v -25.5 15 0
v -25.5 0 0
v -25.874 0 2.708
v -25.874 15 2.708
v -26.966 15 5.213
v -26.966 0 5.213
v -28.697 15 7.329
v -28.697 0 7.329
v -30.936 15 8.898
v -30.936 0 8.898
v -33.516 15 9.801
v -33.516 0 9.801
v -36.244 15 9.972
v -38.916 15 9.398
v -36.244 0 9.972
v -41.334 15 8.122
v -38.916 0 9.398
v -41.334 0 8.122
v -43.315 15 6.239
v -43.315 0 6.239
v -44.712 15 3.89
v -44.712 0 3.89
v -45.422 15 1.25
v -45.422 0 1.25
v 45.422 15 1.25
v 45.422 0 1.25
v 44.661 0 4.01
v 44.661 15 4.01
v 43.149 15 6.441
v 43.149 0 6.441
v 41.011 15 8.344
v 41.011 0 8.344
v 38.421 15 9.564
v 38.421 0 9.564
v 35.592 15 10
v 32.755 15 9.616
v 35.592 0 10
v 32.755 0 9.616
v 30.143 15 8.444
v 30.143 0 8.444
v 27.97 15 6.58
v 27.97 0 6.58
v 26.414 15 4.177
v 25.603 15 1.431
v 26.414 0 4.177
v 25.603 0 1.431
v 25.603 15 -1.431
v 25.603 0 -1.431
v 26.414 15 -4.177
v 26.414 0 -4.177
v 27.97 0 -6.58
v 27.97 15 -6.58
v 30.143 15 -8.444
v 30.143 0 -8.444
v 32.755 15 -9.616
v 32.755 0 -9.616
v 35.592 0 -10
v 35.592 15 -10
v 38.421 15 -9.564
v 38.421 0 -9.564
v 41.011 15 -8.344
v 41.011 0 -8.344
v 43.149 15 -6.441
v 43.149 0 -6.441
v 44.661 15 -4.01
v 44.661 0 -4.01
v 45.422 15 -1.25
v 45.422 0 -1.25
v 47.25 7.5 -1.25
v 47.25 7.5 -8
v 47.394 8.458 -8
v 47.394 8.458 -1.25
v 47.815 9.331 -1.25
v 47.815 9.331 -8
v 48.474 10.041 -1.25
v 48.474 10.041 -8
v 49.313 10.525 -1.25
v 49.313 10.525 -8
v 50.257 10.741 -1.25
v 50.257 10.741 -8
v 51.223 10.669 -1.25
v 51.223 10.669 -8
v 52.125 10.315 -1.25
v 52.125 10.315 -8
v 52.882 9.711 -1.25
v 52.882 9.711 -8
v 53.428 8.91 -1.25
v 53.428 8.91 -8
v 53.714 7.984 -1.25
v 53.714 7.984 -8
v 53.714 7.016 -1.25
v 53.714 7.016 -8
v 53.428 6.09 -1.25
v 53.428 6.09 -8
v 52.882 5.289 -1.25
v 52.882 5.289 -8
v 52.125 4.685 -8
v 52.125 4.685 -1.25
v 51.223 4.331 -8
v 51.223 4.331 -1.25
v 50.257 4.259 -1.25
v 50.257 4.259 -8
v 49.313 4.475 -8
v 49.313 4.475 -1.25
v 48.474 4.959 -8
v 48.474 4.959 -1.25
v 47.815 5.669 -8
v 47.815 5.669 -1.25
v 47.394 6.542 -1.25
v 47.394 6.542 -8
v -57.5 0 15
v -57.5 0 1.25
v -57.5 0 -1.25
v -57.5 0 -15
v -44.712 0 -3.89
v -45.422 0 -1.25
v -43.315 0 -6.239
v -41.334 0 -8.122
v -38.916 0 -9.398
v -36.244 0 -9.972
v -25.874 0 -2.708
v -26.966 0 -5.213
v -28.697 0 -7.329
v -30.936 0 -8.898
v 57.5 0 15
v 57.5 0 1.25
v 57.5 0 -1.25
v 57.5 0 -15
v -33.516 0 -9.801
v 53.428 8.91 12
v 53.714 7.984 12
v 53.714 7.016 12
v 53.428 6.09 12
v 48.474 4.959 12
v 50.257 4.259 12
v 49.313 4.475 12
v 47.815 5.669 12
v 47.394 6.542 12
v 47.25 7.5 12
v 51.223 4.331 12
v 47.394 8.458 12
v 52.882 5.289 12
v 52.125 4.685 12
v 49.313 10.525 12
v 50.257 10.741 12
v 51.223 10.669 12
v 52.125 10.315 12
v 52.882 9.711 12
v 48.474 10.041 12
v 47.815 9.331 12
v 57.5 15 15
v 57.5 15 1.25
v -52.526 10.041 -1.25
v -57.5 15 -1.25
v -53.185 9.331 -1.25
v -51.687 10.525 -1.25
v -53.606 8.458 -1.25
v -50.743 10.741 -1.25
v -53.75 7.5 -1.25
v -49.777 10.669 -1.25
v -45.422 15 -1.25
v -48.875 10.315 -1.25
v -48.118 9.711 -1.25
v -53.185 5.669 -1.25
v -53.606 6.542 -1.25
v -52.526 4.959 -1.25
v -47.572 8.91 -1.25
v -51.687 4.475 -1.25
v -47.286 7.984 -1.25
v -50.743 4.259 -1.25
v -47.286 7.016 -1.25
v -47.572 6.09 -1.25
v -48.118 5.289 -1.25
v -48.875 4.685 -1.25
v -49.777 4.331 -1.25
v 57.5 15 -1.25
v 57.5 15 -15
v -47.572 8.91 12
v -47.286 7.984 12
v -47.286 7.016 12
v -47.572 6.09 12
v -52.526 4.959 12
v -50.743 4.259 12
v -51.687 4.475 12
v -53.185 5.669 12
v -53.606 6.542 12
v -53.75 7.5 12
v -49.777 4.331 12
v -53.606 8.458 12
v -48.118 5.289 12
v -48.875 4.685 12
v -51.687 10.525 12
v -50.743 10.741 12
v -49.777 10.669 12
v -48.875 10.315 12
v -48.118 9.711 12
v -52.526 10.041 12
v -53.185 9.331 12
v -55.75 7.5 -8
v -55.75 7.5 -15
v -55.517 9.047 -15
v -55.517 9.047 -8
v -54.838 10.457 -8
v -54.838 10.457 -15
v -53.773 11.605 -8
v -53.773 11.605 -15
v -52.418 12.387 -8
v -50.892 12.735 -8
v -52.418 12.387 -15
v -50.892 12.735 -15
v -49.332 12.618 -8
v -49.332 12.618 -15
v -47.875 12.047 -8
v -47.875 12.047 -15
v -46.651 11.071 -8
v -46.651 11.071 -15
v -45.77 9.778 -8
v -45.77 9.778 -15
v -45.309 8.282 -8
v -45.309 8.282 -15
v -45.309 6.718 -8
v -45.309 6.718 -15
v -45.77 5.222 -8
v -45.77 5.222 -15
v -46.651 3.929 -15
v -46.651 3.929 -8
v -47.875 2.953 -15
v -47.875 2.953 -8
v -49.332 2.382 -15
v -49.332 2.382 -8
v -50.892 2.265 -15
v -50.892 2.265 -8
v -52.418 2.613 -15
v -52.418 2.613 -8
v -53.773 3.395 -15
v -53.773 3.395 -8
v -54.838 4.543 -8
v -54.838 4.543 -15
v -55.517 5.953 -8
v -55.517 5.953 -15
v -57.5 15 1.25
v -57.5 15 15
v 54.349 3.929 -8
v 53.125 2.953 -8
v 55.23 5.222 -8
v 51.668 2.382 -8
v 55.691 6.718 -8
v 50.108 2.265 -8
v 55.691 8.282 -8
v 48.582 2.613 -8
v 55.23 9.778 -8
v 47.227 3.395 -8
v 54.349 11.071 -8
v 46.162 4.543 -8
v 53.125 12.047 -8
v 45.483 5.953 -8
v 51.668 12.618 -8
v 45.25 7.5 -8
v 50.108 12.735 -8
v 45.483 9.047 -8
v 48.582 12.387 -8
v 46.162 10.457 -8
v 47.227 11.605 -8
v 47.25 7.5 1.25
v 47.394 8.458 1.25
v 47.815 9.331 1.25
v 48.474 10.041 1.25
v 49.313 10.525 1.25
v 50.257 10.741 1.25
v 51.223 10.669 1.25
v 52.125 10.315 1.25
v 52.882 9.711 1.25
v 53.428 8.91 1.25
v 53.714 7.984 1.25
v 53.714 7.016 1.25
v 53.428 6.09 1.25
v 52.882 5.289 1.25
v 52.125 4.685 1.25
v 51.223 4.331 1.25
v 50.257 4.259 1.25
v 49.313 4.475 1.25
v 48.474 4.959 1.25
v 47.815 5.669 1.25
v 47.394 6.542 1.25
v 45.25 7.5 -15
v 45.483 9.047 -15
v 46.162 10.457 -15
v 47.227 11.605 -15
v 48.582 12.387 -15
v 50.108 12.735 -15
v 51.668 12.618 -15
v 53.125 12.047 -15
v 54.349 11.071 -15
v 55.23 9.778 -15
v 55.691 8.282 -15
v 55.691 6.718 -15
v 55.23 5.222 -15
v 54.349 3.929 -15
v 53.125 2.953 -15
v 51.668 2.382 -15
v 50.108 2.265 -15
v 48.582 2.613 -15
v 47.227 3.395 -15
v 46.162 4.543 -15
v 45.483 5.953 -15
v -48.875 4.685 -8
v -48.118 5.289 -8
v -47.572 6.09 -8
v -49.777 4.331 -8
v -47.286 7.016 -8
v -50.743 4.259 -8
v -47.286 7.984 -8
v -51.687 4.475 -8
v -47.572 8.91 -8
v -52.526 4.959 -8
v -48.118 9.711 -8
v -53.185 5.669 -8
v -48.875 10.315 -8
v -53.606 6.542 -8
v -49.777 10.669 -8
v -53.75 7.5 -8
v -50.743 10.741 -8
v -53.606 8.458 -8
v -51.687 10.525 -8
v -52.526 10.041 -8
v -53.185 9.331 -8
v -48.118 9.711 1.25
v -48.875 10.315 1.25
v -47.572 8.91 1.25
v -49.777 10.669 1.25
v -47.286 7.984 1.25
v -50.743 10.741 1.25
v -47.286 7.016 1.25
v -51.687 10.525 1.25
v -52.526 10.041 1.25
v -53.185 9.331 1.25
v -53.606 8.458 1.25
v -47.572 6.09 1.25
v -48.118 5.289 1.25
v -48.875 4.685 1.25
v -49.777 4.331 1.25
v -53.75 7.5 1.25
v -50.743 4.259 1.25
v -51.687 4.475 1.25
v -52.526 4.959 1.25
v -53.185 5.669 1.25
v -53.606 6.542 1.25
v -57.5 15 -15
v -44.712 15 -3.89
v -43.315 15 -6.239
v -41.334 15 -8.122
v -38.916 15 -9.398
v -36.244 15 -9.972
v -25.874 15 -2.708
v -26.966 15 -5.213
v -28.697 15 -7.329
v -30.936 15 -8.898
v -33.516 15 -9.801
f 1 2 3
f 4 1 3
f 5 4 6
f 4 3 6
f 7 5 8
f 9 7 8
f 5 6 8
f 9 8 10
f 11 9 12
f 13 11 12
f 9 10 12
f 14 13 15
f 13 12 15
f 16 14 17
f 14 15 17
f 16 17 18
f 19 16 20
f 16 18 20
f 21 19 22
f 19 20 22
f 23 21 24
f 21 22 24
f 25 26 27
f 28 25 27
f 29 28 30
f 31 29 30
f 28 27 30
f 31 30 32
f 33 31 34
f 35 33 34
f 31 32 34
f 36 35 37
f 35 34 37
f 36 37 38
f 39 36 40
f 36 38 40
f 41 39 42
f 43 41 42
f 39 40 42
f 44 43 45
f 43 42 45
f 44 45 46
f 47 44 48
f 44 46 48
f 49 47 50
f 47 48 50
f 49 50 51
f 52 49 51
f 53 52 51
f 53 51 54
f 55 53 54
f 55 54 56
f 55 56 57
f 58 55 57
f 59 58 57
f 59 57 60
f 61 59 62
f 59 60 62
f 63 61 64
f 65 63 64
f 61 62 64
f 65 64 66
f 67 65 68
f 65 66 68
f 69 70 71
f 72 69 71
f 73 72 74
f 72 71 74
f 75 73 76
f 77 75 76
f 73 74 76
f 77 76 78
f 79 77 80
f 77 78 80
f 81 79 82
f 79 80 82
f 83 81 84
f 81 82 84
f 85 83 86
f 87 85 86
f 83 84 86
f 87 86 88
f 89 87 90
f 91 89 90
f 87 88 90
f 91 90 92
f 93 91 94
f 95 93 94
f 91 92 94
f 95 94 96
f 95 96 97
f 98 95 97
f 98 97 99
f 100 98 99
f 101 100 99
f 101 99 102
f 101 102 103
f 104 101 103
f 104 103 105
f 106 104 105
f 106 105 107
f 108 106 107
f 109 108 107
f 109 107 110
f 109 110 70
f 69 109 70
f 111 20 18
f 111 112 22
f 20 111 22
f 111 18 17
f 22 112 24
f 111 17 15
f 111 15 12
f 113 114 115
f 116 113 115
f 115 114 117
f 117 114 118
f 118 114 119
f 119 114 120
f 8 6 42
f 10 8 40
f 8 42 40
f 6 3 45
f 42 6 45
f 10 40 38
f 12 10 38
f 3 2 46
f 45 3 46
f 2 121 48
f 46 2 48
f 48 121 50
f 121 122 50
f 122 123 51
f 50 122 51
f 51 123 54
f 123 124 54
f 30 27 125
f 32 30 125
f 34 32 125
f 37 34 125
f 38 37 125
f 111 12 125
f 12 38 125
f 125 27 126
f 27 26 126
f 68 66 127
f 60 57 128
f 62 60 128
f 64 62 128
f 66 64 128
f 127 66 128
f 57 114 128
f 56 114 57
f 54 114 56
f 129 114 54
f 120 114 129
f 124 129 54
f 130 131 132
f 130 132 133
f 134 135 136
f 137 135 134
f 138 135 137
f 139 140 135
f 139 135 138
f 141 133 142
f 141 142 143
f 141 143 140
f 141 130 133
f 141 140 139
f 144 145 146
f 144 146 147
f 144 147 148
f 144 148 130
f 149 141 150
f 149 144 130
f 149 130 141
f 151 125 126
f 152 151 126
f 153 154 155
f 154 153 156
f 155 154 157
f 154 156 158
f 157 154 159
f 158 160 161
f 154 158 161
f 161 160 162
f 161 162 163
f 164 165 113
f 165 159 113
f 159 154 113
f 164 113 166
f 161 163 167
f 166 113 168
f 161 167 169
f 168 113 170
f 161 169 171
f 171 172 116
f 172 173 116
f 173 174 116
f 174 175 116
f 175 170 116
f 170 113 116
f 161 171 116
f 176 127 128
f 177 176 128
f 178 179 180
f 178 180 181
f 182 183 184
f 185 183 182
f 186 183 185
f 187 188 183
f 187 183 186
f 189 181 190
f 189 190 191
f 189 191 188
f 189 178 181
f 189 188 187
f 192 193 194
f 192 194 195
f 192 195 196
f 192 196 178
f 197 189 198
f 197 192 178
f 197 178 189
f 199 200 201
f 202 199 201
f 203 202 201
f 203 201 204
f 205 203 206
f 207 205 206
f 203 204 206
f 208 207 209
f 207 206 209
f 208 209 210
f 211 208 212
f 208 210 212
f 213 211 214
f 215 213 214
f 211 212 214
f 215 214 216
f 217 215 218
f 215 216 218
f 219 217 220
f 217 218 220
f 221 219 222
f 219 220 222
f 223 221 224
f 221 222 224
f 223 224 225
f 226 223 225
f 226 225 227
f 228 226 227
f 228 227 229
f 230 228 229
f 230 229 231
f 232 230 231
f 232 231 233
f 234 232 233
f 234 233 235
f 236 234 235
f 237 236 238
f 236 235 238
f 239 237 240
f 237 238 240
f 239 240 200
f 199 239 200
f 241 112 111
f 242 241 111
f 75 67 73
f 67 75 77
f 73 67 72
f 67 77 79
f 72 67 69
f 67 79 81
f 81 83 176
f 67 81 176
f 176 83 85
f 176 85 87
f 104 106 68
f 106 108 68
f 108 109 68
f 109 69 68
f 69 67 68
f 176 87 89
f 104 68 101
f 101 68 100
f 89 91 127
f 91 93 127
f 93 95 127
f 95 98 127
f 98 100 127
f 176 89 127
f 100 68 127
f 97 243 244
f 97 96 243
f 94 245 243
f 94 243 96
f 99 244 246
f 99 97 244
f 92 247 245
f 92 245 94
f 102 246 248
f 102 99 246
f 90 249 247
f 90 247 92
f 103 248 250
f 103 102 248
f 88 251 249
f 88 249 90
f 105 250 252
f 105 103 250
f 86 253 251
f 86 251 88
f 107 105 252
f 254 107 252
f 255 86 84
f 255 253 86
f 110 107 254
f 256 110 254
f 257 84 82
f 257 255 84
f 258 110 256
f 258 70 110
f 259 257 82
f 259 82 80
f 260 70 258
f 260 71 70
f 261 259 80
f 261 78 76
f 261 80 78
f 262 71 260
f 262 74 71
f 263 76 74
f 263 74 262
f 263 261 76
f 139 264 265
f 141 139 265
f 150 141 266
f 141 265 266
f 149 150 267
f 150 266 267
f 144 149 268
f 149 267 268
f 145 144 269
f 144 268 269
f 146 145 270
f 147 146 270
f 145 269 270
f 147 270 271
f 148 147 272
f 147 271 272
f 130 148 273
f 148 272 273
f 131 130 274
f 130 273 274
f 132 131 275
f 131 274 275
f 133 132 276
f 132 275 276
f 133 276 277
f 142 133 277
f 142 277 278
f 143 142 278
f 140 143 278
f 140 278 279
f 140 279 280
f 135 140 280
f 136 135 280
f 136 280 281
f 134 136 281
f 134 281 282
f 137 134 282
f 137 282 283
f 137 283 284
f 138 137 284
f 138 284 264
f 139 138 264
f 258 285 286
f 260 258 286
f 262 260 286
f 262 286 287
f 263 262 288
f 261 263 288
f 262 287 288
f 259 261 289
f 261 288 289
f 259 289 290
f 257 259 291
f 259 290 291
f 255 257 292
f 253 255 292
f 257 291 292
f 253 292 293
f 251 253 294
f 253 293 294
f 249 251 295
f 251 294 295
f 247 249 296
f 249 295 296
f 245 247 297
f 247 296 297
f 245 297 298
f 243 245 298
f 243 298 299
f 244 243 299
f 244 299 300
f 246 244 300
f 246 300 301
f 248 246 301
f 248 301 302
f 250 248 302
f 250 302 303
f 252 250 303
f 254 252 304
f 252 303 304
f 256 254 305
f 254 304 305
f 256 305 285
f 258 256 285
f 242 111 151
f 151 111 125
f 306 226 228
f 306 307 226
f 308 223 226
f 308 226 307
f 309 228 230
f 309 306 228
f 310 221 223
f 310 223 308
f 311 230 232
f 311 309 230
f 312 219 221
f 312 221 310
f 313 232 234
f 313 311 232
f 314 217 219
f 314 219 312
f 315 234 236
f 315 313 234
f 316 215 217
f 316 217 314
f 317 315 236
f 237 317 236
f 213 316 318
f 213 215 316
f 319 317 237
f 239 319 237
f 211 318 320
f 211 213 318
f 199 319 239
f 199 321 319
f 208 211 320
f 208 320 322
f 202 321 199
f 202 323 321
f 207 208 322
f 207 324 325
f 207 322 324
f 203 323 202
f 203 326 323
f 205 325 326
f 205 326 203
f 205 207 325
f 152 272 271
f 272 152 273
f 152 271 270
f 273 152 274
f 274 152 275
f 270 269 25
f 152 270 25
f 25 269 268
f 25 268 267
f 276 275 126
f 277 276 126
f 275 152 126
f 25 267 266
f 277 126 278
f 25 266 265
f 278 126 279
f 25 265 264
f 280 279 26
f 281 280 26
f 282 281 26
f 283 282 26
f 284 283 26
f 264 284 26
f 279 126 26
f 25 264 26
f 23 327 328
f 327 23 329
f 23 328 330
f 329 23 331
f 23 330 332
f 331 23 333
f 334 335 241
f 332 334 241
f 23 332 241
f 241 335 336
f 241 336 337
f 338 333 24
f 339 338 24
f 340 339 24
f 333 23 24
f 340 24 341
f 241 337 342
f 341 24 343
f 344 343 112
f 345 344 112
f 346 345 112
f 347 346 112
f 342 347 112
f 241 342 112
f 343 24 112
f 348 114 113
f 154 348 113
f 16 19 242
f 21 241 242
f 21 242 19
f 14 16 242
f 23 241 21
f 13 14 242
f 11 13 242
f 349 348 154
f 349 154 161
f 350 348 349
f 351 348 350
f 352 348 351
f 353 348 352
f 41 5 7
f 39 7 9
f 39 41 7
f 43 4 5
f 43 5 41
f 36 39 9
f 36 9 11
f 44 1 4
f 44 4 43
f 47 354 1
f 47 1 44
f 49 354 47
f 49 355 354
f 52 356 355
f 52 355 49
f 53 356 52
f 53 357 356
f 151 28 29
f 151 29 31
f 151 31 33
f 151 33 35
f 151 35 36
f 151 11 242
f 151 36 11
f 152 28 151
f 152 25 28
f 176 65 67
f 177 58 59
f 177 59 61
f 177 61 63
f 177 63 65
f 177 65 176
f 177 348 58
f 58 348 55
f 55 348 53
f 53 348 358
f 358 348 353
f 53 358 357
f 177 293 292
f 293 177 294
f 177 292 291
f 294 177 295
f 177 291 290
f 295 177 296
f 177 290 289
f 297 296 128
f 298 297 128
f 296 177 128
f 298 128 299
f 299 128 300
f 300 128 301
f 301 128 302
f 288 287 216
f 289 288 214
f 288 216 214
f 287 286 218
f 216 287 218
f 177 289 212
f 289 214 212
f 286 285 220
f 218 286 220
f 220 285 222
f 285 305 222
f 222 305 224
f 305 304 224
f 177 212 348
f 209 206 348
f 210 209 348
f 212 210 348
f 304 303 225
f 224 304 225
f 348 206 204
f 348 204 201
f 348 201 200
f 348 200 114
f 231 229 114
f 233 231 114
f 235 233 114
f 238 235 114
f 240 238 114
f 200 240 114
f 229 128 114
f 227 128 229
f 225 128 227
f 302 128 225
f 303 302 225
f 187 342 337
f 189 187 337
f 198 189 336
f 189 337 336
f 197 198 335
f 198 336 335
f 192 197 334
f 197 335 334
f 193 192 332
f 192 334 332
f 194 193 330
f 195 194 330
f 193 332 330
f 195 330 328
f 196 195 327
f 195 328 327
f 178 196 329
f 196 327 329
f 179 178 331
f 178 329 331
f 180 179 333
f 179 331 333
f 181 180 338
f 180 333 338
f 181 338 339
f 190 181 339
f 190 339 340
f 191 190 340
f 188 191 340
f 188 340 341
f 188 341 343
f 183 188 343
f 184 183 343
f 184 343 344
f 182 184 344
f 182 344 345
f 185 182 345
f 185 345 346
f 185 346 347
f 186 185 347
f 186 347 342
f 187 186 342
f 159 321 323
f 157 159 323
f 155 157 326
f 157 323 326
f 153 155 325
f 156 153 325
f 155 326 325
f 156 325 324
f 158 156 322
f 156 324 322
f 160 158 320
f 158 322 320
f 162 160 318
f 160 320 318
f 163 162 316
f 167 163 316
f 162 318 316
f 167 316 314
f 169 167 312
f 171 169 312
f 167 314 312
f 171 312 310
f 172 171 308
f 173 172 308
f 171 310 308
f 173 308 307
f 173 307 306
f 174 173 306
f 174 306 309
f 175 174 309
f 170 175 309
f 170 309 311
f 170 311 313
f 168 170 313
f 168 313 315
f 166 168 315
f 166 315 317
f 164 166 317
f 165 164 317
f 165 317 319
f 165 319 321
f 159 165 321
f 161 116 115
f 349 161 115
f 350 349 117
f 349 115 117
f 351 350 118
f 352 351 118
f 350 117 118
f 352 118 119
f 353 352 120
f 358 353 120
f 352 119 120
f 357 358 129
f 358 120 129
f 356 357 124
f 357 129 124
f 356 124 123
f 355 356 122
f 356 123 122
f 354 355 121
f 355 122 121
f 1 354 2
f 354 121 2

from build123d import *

# Parameters (mm, degrees)
BOSS_EXTRUDE1_DEPTH = 15
SKETCH2_R           = 5.25
CUT_EXTRUDE1_DEPTH  = 7
SKETCH3_R           = 3.25
CUT_EXTRUDE2_DEPTH  = 20


with BuildPart() as part:
    # Sketch1 → Boss-Extrude1 (new body)
    with BuildSketch(Plane(origin=(0, 0, 0), x_dir=(1, 0, 0), z_dir=(0, 1, 0))):
        with BuildLine():
            Line((57.5, 15), (-57.5, 15))
            Line((-57.5, 15), (-57.5, 1.25))
            Line((-57.5, 1.25), (-45.421567416, 1.25))
            ThreePointArc((-45.421567416, 1.25), (-34.873770875, 9.980372592), (-25.5, 0))
            ThreePointArc((-25.5, 0), (-34.873770875, -9.980372592), (-45.421567416, -1.25))
            Line((-45.421567416, -1.25), (-57.5, -1.25))
            Line((-57.5, -1.25), (-57.5, -15))
            Line((-57.5, -15), (57.5, -15))
            Line((57.5, -15), (57.5, -1.25))
            Line((57.5, -1.25), (45.421567416, -1.25))
            ThreePointArc((45.421567416, -1.25), (25.5, 0), (45.421567416, 1.25))
            Line((45.421567416, 1.25), (57.5, 1.25))
            Line((57.5, 1.25), (57.5, 15))
        make_face()
    extrude(amount=BOSS_EXTRUDE1_DEPTH)

    # Sketch2 → Cut-Extrude1 (cut)
    with BuildSketch(Plane(origin=(0, 0, -15), x_dir=(-1, 0, 0), z_dir=(0, 0, -1))):
        with Locations((-50.5, 7.5)):
            Circle(SKETCH2_R)
        with Locations((50.5, 7.5)):
            Circle(SKETCH2_R)
    extrude(amount=-CUT_EXTRUDE1_DEPTH, mode=Mode.SUBTRACT)

    # Sketch3 → Cut-Extrude2 (cut)
    with BuildSketch(Plane(origin=(0, 0, -8), x_dir=(-1, 0, 0), z_dir=(0, 0, -1))):
        with Locations((-50.5, 7.5)):
            Circle(SKETCH3_R)
        with Locations((50.5, 7.5)):
            Circle(SKETCH3_R)
    extrude(amount=-CUT_EXTRUDE2_DEPTH, mode=Mode.SUBTRACT)


solid = part.part
